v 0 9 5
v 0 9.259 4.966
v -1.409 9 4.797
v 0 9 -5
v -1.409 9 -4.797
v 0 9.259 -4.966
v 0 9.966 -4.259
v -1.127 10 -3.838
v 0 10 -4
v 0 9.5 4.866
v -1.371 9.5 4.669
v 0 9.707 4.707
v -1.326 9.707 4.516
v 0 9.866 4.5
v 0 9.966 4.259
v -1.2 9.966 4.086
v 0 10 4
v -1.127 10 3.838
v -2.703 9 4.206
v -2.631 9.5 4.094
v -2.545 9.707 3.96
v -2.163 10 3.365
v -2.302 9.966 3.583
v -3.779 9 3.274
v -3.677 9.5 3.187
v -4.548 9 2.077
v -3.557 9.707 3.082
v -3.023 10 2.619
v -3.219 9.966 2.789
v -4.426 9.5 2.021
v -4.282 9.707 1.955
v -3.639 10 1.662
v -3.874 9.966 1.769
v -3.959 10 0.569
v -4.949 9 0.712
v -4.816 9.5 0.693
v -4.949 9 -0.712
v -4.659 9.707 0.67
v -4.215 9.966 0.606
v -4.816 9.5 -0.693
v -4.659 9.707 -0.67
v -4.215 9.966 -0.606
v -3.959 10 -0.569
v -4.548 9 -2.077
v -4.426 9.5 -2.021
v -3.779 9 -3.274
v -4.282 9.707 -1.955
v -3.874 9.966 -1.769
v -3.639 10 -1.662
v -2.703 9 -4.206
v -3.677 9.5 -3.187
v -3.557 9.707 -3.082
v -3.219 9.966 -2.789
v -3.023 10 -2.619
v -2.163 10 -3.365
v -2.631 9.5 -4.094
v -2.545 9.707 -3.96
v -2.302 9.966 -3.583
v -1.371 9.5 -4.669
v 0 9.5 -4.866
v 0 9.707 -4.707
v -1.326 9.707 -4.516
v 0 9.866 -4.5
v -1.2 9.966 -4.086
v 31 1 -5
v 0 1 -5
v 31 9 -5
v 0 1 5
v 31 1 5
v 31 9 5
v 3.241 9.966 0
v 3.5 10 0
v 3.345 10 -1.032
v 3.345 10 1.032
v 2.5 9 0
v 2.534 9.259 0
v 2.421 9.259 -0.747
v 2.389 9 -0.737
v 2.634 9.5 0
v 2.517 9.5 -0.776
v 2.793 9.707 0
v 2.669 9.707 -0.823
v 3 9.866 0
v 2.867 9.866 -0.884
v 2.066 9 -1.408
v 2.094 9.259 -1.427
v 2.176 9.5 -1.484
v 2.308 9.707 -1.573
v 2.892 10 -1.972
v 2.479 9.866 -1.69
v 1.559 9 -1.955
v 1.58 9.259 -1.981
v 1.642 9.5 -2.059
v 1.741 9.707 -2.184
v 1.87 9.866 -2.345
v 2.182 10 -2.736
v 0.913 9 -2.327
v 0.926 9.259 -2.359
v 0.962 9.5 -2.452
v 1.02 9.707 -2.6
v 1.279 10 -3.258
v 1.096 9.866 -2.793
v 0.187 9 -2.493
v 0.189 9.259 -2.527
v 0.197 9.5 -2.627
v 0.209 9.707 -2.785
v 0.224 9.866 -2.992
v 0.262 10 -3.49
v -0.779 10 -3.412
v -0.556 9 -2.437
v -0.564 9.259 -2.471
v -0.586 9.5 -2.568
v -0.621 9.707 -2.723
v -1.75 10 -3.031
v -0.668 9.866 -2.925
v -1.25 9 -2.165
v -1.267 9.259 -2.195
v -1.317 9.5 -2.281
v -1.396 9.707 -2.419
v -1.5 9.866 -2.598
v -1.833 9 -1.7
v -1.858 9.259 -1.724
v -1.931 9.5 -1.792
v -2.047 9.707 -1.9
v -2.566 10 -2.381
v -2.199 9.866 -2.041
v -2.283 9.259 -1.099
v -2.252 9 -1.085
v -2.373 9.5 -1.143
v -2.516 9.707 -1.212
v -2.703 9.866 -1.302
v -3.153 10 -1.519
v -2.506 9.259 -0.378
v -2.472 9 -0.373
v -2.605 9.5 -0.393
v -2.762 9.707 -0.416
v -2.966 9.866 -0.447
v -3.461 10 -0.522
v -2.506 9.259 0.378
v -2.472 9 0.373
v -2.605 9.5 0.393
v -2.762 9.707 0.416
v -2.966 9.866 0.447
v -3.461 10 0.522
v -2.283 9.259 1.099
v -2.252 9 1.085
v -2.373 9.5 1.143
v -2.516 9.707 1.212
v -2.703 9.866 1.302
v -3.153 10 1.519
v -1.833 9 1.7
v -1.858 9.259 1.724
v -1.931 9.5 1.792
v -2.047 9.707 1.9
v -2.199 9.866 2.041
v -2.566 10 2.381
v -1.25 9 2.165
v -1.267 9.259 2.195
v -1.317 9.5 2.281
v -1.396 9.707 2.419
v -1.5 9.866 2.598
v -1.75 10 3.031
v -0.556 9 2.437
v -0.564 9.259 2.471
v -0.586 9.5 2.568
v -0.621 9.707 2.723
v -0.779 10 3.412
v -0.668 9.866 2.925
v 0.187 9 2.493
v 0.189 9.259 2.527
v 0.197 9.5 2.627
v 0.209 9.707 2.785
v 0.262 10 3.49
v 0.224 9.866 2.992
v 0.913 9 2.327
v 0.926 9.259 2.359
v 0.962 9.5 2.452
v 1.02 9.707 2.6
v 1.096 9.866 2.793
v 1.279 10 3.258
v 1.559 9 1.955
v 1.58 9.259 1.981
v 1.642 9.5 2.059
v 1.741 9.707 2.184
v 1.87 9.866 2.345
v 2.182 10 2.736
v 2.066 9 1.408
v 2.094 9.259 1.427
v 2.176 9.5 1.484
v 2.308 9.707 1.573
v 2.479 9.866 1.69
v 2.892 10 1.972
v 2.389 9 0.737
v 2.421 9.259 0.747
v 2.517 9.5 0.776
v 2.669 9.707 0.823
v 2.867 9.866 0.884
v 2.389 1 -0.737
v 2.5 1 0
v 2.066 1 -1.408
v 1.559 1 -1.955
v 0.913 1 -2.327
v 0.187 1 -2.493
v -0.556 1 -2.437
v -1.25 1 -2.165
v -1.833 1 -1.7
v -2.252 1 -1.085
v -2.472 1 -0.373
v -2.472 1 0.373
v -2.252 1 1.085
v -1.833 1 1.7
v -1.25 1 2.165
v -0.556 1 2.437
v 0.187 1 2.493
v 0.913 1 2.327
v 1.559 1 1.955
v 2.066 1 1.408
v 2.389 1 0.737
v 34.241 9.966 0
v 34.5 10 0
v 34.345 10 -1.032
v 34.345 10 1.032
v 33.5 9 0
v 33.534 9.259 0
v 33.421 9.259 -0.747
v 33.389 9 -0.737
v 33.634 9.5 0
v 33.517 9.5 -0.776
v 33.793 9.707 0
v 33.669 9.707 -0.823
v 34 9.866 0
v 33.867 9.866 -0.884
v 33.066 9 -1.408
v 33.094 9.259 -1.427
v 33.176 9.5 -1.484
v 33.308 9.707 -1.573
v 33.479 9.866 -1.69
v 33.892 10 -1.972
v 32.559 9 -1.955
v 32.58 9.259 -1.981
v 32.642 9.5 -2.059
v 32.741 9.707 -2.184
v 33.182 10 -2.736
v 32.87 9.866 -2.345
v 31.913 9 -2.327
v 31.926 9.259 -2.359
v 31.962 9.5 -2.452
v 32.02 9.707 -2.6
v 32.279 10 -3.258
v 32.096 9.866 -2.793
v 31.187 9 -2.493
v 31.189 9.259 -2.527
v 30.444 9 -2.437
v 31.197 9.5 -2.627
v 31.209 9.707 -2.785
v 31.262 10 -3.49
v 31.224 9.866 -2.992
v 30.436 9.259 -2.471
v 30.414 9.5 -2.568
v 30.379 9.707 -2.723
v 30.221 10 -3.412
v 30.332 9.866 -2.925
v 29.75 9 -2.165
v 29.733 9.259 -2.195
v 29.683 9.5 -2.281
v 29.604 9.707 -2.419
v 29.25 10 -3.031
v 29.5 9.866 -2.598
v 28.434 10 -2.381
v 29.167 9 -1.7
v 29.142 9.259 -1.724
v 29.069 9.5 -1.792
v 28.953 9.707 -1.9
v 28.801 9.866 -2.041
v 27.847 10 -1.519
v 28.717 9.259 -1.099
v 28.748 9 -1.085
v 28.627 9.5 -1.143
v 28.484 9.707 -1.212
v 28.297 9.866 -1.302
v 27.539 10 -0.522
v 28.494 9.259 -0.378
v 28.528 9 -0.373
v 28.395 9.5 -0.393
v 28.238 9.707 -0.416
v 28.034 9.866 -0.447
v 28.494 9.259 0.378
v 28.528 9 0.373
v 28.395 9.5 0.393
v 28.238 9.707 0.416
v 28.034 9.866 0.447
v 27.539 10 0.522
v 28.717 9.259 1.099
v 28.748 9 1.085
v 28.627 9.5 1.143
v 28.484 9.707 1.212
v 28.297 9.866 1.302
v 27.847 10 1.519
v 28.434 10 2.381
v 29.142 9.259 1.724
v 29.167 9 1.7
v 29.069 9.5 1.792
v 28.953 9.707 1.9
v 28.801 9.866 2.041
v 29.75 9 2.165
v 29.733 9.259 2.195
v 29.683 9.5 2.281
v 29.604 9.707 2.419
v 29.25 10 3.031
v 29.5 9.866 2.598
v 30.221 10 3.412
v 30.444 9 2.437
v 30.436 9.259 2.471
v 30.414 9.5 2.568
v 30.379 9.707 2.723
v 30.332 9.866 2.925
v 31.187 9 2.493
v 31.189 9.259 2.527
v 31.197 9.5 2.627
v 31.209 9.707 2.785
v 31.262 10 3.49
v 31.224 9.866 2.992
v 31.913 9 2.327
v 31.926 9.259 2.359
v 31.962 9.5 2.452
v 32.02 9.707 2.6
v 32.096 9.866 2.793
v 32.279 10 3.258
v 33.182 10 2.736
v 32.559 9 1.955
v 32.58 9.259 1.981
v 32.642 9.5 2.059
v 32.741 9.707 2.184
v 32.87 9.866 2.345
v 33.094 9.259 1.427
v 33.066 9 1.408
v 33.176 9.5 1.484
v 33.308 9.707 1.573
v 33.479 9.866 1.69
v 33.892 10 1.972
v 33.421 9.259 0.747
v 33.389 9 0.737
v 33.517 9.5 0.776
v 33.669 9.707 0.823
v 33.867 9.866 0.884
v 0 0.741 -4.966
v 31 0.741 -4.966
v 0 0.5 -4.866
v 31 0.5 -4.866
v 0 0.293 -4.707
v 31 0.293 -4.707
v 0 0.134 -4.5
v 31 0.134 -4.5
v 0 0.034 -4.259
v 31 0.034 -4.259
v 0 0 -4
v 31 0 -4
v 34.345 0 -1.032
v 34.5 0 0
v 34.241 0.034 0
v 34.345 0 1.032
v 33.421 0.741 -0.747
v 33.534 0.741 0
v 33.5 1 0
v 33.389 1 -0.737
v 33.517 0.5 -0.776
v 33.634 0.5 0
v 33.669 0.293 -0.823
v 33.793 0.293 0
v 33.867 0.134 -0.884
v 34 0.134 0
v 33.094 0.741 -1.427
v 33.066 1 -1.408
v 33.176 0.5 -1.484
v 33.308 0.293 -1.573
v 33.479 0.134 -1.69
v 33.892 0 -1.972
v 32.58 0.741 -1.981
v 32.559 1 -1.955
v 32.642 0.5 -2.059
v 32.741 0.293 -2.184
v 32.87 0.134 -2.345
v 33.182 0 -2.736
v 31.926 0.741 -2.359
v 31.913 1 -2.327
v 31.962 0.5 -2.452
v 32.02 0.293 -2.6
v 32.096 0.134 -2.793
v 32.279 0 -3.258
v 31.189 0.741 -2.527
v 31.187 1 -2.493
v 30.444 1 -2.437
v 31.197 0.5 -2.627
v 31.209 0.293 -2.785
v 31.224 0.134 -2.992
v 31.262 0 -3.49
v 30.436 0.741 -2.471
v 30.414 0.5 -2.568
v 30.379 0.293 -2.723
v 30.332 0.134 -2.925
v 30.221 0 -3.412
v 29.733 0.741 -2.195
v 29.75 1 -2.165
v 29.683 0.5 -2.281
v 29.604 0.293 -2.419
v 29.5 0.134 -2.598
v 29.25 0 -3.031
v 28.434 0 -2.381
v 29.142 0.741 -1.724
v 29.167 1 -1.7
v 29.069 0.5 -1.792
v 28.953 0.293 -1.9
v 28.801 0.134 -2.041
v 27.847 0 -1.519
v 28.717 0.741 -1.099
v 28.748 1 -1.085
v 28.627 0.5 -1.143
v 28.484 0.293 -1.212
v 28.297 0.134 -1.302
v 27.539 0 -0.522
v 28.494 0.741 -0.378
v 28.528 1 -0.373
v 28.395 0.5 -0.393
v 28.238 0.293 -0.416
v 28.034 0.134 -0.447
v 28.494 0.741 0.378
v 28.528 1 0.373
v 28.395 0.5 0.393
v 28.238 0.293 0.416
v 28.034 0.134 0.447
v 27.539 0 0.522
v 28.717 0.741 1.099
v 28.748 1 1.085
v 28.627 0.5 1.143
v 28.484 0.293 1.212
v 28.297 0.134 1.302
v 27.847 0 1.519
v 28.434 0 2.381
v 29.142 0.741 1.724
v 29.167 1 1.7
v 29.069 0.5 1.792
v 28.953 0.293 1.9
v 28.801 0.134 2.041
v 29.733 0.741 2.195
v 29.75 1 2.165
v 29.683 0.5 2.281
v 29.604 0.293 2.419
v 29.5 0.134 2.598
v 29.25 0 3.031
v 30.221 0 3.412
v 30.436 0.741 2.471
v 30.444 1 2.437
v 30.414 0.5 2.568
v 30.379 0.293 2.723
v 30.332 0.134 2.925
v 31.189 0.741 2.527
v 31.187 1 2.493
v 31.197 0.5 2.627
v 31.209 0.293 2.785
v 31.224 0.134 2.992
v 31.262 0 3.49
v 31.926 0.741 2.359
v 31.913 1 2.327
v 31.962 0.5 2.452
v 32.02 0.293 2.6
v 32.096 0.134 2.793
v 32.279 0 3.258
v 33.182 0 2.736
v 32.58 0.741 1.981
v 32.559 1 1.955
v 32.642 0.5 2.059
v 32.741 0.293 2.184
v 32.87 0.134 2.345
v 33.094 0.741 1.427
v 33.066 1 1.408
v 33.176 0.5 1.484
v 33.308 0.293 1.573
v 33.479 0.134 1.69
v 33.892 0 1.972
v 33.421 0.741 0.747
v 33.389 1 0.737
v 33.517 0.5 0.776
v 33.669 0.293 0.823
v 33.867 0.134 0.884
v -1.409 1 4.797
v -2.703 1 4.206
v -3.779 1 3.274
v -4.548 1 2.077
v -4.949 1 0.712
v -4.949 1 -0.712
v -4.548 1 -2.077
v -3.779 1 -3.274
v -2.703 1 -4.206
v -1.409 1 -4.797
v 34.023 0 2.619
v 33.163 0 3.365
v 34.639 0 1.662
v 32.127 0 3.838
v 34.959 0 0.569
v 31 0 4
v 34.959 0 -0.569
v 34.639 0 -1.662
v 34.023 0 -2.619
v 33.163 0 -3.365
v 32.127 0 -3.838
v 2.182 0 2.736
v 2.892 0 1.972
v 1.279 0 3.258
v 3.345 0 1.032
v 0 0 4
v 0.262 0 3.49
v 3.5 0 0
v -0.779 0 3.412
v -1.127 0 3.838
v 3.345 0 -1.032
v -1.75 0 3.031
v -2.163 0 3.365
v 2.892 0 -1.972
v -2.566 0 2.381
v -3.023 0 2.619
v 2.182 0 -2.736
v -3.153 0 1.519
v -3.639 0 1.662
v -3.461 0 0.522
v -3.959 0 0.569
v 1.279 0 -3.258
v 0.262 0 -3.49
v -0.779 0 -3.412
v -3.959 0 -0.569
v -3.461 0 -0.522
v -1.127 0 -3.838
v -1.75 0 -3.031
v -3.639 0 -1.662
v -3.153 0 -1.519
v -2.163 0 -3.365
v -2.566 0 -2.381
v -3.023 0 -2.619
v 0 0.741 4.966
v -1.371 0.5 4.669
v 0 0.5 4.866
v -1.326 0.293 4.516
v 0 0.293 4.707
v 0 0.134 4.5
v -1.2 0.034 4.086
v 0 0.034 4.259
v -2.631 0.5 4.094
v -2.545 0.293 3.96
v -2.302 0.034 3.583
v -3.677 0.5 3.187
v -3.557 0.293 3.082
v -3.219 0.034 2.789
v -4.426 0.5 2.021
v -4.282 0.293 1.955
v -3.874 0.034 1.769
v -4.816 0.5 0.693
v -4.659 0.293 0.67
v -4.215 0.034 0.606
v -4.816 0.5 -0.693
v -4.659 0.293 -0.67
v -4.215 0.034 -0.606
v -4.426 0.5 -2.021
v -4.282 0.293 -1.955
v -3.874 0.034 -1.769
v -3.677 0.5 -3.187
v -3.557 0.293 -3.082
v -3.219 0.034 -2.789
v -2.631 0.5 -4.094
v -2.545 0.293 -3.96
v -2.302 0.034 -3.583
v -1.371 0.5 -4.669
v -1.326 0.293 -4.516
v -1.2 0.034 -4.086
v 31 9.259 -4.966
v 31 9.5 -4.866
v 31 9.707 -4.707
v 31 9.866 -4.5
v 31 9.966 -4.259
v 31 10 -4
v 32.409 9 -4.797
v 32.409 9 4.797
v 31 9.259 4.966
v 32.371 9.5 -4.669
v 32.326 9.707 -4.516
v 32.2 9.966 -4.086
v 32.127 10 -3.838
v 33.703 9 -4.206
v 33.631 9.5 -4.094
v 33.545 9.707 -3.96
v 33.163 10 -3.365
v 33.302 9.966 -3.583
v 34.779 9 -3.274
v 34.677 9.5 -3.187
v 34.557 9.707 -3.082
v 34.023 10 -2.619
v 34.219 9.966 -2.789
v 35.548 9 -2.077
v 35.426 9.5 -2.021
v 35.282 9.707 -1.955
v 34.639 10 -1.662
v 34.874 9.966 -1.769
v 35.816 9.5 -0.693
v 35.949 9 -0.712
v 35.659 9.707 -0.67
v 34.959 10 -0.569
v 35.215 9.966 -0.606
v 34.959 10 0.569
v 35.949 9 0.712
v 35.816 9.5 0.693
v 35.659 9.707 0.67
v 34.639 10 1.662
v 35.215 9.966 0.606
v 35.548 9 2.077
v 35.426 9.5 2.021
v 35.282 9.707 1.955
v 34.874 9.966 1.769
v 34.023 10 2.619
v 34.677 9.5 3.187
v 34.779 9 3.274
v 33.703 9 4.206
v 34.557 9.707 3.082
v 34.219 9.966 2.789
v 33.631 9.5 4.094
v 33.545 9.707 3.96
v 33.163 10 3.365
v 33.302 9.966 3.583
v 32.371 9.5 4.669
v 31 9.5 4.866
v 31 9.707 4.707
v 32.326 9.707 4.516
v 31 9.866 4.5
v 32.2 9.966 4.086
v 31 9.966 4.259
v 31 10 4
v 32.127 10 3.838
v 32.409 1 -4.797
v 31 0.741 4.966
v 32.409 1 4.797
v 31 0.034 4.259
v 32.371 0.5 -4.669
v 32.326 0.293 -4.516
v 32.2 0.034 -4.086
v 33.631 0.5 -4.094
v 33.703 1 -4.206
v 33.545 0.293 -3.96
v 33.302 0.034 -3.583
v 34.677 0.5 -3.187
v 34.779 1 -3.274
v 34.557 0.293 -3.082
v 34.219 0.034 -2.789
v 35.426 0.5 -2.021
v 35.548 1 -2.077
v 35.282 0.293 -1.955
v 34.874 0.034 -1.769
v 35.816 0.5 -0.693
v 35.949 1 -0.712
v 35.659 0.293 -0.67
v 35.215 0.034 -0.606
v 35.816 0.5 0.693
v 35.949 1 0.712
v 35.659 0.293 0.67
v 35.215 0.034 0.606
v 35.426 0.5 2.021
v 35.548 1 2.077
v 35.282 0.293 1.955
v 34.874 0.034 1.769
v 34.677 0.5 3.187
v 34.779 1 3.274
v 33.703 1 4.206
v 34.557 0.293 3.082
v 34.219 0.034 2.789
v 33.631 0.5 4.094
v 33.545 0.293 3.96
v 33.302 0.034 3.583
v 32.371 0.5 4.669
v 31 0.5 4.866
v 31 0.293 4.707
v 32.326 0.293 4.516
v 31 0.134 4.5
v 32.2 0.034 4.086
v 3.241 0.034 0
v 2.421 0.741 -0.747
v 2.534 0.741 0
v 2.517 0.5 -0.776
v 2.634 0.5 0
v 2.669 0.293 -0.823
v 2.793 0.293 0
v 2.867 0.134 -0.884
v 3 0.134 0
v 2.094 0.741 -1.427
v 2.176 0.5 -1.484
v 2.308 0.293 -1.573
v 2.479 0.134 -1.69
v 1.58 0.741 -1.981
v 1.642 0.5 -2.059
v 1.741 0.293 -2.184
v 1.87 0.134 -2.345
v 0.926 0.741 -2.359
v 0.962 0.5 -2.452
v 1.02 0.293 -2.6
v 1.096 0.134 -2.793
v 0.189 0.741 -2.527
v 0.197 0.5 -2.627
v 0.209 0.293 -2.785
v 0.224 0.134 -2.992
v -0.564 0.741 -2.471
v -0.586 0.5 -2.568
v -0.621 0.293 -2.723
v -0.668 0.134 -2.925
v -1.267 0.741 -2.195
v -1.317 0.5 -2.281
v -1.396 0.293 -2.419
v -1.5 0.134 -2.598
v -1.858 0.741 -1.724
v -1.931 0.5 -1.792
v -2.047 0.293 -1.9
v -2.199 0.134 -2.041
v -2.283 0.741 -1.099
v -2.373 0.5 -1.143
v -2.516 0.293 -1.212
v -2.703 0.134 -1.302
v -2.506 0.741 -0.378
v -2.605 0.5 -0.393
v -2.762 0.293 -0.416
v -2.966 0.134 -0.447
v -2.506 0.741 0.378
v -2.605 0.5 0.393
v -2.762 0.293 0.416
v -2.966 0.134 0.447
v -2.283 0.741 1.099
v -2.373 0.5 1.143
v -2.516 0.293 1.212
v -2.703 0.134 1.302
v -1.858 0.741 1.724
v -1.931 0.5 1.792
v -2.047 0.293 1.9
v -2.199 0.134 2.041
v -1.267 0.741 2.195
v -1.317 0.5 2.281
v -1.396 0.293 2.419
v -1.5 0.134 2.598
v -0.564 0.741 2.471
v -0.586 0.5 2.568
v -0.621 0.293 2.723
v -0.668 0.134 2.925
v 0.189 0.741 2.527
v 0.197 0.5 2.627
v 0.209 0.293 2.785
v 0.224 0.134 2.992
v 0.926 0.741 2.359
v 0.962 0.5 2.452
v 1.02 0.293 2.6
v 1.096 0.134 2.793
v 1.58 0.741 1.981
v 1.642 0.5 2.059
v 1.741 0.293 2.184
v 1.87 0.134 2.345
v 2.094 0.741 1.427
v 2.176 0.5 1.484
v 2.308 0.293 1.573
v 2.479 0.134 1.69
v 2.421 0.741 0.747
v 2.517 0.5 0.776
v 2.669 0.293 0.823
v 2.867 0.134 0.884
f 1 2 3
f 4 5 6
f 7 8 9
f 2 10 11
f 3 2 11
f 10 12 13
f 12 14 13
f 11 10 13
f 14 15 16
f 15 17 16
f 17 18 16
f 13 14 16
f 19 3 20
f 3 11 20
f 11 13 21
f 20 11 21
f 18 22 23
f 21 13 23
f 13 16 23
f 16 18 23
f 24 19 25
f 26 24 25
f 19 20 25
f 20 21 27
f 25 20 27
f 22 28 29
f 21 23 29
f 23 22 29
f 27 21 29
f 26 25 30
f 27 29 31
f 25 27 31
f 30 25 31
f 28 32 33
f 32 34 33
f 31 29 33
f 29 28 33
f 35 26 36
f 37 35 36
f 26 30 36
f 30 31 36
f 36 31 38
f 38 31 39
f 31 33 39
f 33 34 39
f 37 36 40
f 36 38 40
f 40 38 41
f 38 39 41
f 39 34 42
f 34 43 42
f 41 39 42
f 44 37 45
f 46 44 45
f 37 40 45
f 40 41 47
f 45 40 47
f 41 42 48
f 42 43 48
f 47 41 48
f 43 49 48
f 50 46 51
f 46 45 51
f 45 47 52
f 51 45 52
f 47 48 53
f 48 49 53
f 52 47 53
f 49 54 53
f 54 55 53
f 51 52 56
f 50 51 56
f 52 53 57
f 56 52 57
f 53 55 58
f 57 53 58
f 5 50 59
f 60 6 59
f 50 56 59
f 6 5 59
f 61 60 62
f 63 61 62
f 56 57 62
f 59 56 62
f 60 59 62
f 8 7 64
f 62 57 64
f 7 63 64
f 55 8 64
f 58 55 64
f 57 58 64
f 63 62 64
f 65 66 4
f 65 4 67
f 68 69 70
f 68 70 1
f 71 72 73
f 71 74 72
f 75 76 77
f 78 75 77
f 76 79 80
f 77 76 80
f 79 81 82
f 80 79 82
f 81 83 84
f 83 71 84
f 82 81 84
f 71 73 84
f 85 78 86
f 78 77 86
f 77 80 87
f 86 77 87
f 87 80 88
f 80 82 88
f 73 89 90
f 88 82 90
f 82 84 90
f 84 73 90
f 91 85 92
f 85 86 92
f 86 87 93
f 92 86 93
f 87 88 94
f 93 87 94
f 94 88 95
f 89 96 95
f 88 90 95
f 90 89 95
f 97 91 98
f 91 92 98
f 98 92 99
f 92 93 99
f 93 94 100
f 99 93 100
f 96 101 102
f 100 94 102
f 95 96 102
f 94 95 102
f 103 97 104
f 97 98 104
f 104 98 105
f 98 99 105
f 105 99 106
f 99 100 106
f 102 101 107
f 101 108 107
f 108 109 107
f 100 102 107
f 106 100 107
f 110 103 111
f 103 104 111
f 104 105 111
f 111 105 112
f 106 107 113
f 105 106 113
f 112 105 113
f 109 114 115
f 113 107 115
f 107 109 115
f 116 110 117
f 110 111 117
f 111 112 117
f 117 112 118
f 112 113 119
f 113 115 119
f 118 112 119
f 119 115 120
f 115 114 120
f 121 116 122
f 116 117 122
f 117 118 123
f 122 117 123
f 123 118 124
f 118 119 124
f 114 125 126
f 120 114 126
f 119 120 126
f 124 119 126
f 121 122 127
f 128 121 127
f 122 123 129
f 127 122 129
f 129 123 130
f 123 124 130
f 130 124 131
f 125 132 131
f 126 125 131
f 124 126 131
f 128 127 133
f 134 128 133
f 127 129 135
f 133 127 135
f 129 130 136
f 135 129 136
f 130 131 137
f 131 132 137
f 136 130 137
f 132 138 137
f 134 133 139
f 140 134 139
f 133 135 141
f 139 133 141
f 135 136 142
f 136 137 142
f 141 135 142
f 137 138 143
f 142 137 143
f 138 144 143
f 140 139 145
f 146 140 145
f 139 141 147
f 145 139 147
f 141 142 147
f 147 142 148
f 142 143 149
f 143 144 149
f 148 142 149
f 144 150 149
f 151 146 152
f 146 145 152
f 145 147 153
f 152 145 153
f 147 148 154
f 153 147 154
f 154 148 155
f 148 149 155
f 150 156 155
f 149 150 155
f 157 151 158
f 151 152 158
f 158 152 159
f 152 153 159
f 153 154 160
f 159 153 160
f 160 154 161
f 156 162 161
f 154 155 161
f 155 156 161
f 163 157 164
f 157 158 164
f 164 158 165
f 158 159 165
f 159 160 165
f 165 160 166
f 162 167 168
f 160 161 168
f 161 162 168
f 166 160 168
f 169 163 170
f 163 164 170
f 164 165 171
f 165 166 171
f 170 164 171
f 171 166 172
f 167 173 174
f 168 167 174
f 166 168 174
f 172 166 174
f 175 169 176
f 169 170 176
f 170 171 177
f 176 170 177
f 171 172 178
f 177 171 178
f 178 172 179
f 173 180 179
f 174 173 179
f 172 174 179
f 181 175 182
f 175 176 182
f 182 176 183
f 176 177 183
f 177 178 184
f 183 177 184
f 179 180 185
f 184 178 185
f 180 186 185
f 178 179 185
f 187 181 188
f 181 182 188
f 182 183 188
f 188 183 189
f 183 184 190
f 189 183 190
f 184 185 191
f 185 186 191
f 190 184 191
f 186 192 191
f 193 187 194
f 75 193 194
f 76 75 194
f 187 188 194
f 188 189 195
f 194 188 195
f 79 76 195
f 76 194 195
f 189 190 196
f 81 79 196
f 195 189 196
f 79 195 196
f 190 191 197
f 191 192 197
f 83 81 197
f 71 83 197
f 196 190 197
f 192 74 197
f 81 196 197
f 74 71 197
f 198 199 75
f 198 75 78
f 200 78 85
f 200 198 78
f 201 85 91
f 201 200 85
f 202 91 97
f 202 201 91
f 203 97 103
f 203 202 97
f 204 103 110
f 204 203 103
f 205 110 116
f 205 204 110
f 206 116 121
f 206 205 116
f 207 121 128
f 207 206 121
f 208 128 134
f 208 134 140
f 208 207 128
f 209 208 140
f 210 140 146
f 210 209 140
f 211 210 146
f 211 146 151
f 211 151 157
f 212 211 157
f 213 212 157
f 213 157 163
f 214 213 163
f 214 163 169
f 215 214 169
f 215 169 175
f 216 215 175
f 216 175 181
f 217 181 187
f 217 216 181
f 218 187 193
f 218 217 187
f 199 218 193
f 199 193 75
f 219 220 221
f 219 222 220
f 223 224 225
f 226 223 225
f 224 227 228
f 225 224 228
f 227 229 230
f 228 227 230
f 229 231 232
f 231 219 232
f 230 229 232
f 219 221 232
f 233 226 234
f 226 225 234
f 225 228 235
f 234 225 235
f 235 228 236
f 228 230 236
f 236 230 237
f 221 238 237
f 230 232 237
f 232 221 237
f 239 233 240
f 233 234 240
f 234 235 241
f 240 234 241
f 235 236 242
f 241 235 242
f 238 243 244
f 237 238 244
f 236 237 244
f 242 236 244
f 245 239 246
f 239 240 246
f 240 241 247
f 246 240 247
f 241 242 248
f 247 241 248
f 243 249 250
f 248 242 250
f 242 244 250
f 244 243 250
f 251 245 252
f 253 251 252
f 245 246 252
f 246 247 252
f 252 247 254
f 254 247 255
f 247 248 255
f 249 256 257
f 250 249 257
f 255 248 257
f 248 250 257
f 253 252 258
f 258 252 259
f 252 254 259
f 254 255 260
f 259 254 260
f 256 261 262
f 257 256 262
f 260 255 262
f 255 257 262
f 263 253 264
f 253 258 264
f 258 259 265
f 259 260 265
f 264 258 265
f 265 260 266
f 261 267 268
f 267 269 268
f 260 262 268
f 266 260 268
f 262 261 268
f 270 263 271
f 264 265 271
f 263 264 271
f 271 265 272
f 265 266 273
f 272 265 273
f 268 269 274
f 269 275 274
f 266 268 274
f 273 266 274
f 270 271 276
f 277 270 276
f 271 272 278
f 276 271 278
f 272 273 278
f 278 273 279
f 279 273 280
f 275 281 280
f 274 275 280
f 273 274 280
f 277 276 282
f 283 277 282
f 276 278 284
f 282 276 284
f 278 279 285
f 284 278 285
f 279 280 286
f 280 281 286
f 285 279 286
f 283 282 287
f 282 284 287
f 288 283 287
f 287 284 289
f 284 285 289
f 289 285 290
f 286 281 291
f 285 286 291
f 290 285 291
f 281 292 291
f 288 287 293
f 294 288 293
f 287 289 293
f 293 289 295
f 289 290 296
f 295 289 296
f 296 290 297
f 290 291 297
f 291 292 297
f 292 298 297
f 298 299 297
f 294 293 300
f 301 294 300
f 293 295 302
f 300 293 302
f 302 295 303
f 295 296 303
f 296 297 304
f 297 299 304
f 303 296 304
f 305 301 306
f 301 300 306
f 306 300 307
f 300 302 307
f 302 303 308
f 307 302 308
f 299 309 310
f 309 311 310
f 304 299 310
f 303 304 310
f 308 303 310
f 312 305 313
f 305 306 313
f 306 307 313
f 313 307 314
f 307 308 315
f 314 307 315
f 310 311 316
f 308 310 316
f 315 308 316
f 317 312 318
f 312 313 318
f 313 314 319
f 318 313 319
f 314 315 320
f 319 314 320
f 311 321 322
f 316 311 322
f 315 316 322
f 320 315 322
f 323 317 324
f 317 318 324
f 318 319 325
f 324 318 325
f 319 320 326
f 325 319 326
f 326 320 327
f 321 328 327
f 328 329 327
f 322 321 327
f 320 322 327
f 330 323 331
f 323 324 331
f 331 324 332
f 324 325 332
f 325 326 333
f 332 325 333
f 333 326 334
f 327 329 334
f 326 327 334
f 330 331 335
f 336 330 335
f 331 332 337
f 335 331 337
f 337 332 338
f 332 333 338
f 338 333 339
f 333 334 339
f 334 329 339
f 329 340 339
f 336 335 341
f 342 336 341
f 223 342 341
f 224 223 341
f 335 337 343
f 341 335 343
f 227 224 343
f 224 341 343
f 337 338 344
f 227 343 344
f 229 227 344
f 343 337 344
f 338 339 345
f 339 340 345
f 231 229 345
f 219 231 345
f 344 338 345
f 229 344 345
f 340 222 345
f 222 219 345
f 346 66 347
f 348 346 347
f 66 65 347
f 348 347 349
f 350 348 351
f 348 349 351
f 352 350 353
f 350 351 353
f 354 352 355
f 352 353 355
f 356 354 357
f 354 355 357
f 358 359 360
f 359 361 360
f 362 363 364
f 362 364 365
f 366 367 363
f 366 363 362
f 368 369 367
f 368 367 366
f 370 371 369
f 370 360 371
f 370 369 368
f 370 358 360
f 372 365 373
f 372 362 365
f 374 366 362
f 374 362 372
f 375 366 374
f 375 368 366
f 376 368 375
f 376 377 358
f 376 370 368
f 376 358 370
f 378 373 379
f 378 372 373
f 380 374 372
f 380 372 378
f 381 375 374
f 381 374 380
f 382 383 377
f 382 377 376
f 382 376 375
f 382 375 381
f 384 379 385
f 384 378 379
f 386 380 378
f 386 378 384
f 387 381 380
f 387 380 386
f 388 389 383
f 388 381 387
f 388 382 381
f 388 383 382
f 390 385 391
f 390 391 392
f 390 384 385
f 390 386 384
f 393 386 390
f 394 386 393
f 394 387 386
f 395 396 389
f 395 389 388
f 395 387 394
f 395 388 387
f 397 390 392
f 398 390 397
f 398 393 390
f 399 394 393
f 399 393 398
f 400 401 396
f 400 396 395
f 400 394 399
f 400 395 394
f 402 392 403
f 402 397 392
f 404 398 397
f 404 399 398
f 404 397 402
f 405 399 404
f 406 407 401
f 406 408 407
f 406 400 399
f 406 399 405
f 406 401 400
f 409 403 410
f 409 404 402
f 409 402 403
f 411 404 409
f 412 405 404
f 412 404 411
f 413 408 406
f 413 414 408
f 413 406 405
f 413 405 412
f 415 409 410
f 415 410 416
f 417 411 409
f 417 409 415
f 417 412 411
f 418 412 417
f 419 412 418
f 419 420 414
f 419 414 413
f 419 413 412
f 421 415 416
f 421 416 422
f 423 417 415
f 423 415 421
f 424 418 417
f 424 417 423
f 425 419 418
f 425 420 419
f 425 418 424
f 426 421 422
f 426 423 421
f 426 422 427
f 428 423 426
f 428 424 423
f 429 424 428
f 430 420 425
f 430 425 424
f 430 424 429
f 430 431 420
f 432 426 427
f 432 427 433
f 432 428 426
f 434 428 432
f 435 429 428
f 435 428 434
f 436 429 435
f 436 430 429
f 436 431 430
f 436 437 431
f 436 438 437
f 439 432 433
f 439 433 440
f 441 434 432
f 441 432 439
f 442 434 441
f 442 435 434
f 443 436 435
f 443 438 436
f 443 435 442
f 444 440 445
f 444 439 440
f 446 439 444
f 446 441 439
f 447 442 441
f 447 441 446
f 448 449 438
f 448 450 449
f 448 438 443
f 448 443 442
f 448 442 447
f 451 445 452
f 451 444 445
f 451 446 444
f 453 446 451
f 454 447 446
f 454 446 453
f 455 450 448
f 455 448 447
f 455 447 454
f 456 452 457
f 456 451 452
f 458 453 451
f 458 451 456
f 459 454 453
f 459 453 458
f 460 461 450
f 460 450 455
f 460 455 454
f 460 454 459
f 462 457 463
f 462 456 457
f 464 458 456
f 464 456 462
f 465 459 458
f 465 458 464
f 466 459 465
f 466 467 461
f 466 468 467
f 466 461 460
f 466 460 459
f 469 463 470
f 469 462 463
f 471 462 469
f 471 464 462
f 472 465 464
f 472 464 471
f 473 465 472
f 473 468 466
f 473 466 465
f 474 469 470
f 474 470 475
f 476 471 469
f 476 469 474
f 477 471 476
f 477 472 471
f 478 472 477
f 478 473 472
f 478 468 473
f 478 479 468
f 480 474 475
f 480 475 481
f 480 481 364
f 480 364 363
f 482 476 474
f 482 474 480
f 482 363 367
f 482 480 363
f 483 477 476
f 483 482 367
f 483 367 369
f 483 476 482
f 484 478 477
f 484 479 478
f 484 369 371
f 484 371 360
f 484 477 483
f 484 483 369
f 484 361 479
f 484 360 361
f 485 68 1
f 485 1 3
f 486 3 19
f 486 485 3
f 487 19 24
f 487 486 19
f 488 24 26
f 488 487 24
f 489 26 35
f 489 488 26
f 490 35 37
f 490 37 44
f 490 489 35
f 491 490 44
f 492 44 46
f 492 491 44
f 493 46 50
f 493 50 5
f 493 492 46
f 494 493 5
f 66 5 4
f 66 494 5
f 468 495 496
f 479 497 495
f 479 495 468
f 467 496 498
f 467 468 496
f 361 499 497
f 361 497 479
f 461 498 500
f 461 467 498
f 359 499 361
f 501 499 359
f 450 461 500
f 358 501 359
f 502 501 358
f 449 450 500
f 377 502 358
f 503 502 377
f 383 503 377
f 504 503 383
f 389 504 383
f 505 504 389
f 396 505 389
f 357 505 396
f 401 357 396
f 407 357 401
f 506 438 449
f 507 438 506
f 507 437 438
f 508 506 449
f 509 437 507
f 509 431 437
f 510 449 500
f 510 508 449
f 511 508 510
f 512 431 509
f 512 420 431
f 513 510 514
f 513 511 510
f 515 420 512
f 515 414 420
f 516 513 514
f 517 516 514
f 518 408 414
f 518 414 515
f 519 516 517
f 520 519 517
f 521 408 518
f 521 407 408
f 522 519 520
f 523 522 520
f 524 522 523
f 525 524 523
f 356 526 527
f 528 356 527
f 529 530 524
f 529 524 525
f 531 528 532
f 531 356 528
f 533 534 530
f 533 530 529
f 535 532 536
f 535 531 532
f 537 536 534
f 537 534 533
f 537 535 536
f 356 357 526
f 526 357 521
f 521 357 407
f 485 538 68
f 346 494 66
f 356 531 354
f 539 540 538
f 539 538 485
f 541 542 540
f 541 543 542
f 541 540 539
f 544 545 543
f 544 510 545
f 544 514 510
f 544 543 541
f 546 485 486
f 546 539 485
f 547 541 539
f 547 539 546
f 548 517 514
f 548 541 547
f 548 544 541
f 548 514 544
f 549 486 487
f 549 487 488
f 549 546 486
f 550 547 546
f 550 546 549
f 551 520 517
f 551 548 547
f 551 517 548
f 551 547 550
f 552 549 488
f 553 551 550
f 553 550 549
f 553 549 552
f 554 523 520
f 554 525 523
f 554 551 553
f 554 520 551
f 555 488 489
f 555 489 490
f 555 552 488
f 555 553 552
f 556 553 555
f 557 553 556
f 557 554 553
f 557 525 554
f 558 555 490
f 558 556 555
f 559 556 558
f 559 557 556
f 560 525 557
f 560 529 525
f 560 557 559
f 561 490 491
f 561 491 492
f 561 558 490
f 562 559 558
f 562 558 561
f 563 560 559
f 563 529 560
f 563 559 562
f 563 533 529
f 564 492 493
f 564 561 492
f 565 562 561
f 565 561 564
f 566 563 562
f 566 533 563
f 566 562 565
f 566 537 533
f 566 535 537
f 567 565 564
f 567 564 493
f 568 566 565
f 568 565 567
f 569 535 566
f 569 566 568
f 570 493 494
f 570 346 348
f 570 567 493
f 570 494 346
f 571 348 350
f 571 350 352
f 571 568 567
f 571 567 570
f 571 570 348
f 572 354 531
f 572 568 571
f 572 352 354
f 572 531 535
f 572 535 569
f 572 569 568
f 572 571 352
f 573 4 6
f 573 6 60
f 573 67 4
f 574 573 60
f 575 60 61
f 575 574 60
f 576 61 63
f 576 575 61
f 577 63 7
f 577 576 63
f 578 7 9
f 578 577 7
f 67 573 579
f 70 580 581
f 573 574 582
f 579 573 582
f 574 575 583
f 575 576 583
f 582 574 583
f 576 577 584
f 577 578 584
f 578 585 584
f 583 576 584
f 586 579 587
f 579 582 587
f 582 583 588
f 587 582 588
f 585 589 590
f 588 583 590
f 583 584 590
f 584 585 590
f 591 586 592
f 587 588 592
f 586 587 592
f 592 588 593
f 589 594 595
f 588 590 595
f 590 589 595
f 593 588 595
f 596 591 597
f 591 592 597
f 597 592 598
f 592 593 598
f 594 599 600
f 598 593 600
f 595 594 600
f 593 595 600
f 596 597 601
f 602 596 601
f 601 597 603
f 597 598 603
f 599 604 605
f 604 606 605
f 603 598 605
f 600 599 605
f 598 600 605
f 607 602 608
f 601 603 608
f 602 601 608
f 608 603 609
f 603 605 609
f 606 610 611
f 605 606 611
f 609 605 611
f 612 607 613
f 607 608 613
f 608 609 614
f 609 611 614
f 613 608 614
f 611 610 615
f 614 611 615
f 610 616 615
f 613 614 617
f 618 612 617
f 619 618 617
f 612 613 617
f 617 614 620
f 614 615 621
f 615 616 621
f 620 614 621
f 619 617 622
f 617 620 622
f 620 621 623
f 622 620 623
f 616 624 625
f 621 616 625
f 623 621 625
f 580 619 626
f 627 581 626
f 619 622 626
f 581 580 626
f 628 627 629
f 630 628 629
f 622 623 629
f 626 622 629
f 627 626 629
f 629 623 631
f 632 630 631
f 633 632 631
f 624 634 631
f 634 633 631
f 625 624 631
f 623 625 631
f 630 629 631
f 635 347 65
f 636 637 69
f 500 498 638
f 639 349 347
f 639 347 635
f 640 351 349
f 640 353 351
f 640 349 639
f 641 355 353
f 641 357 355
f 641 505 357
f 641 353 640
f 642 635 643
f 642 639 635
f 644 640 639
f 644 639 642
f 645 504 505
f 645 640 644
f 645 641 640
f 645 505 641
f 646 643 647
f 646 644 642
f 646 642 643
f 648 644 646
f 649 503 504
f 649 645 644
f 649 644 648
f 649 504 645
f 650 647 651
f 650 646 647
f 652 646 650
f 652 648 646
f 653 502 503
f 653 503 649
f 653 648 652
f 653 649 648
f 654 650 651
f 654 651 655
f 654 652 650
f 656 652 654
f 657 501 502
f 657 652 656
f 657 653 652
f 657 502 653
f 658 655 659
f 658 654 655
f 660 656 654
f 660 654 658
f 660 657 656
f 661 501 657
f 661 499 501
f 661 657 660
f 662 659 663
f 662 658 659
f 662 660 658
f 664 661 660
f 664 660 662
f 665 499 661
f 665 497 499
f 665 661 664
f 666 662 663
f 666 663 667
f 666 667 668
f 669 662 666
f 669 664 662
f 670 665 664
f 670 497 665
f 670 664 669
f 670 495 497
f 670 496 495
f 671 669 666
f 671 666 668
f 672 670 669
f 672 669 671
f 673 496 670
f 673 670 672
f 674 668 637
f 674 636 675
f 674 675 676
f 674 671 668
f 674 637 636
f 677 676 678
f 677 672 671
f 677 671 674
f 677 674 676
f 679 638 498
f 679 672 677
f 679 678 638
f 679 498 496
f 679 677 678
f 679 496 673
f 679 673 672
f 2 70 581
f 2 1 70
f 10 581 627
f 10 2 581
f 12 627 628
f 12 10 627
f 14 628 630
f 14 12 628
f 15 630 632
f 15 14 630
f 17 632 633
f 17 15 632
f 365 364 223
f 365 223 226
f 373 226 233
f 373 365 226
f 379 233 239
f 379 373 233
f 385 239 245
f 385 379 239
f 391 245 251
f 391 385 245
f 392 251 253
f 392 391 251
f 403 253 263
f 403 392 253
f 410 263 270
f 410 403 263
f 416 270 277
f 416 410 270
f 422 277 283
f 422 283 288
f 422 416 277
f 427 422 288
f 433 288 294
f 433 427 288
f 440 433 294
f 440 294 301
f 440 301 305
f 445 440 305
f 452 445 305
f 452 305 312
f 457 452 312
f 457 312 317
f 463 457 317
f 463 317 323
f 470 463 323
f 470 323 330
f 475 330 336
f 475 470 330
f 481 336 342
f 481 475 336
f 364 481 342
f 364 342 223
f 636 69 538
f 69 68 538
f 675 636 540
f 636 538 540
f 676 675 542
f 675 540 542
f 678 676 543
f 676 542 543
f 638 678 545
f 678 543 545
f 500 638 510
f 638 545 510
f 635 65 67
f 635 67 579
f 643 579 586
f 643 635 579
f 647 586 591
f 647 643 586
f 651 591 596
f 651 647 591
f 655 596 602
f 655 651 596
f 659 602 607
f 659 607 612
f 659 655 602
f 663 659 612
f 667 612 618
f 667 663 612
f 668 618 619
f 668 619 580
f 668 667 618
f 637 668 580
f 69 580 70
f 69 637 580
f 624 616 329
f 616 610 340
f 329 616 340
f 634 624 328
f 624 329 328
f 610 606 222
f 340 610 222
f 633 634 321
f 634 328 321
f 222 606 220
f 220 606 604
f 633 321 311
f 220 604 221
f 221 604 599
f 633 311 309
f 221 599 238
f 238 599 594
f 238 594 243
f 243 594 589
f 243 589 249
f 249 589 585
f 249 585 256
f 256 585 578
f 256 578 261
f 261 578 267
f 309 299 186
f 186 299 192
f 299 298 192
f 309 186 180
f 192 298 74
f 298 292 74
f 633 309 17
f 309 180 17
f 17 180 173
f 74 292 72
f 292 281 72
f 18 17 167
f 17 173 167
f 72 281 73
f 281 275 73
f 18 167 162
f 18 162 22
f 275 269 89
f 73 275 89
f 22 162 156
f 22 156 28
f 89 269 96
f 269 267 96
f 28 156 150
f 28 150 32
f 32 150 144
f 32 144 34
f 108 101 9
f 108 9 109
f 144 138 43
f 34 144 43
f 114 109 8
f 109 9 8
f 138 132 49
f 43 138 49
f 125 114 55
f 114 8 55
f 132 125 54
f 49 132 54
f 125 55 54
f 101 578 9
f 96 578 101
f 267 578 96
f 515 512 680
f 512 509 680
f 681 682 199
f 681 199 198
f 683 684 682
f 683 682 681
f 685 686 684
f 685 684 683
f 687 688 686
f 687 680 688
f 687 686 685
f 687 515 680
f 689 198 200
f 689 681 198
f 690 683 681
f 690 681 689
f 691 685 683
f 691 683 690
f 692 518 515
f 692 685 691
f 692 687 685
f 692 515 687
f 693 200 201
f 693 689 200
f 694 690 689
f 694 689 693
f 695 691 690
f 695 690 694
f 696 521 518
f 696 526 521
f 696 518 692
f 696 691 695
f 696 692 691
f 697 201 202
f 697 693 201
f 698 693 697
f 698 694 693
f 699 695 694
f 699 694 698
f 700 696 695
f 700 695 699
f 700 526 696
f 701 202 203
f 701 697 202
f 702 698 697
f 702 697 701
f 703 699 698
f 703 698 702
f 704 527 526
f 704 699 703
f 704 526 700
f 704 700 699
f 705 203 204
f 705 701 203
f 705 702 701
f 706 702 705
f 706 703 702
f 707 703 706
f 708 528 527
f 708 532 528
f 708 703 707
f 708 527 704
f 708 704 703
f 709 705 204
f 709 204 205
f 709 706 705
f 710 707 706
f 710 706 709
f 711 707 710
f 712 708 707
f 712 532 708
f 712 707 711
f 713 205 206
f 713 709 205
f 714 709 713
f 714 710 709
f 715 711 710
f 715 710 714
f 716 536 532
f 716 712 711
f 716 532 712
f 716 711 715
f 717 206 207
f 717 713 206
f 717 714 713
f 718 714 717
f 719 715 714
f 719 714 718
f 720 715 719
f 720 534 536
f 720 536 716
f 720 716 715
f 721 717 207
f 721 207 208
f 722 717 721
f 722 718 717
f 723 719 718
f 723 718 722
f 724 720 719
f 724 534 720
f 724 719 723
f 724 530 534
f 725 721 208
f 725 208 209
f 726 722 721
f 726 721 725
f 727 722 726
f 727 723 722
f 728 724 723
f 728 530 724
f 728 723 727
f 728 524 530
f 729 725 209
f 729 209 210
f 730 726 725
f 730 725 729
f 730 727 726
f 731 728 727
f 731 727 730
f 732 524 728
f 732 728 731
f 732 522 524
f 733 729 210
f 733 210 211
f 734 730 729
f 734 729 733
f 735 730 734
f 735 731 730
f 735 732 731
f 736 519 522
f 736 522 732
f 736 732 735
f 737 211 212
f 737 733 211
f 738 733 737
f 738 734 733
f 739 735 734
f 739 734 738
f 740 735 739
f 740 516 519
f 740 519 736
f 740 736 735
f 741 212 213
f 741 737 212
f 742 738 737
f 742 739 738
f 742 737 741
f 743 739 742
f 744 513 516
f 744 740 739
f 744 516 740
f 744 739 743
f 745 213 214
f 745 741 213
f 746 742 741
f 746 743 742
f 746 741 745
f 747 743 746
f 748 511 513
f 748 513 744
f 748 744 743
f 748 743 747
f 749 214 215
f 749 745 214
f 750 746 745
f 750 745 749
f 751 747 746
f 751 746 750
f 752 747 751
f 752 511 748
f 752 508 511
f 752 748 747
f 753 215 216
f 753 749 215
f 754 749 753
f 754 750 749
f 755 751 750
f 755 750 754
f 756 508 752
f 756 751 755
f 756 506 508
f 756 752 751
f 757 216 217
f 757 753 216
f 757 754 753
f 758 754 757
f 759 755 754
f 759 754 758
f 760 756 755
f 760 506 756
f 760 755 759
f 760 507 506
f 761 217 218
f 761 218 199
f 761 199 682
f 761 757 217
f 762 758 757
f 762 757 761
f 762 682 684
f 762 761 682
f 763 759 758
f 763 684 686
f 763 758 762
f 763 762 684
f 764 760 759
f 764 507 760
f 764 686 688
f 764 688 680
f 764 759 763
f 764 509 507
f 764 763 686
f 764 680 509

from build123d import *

# Parameters (mm, degrees)
SKETCH1_R           = 2.5
BOSS_EXTRUDE1_DEPTH = 10
FILLET1_R           = 1


with BuildPart() as part:
    # Sketch1 → Boss-Extrude1 (new body)
    with BuildSketch(Plane(origin=(0, 0, 0), x_dir=(1, 0, 0), z_dir=(0, 1, 0))):
        with BuildLine():
            Line((0, 5), (31, 5))
            ThreePointArc((31, 5), (36, 0), (31, -5))
            Line((31, -5), (0, -5))
            ThreePointArc((0, -5), (-5, 0), (0, 5))
        make_face()
        Circle(SKETCH1_R, mode=Mode.SUBTRACT)
        with Locations((31, 0)):
            Circle(SKETCH1_R, mode=Mode.SUBTRACT)
    extrude(amount=BOSS_EXTRUDE1_DEPTH)

    # Fillet1
    fillet1_edges = [part.edges().sort_by_distance(p)[0] for p in [
        (-2.5, 0, 0),
        (-2.5, 10, 0),
        (36, 10, 0),
        (28.5, 0, 0),
        (28.5, 10, 0),
        (15.5, 10, -5),
        (-5, 10, 0),
        (15.5, 0, -5),
        (36, 0, 0),
        (15.5, 0, 5),
        (-5, 0, 0),
        (15.5, 10, 5),
    ]]
    fillet(fillet1_edges, radius=FILLET1_R)


solid = part.part
